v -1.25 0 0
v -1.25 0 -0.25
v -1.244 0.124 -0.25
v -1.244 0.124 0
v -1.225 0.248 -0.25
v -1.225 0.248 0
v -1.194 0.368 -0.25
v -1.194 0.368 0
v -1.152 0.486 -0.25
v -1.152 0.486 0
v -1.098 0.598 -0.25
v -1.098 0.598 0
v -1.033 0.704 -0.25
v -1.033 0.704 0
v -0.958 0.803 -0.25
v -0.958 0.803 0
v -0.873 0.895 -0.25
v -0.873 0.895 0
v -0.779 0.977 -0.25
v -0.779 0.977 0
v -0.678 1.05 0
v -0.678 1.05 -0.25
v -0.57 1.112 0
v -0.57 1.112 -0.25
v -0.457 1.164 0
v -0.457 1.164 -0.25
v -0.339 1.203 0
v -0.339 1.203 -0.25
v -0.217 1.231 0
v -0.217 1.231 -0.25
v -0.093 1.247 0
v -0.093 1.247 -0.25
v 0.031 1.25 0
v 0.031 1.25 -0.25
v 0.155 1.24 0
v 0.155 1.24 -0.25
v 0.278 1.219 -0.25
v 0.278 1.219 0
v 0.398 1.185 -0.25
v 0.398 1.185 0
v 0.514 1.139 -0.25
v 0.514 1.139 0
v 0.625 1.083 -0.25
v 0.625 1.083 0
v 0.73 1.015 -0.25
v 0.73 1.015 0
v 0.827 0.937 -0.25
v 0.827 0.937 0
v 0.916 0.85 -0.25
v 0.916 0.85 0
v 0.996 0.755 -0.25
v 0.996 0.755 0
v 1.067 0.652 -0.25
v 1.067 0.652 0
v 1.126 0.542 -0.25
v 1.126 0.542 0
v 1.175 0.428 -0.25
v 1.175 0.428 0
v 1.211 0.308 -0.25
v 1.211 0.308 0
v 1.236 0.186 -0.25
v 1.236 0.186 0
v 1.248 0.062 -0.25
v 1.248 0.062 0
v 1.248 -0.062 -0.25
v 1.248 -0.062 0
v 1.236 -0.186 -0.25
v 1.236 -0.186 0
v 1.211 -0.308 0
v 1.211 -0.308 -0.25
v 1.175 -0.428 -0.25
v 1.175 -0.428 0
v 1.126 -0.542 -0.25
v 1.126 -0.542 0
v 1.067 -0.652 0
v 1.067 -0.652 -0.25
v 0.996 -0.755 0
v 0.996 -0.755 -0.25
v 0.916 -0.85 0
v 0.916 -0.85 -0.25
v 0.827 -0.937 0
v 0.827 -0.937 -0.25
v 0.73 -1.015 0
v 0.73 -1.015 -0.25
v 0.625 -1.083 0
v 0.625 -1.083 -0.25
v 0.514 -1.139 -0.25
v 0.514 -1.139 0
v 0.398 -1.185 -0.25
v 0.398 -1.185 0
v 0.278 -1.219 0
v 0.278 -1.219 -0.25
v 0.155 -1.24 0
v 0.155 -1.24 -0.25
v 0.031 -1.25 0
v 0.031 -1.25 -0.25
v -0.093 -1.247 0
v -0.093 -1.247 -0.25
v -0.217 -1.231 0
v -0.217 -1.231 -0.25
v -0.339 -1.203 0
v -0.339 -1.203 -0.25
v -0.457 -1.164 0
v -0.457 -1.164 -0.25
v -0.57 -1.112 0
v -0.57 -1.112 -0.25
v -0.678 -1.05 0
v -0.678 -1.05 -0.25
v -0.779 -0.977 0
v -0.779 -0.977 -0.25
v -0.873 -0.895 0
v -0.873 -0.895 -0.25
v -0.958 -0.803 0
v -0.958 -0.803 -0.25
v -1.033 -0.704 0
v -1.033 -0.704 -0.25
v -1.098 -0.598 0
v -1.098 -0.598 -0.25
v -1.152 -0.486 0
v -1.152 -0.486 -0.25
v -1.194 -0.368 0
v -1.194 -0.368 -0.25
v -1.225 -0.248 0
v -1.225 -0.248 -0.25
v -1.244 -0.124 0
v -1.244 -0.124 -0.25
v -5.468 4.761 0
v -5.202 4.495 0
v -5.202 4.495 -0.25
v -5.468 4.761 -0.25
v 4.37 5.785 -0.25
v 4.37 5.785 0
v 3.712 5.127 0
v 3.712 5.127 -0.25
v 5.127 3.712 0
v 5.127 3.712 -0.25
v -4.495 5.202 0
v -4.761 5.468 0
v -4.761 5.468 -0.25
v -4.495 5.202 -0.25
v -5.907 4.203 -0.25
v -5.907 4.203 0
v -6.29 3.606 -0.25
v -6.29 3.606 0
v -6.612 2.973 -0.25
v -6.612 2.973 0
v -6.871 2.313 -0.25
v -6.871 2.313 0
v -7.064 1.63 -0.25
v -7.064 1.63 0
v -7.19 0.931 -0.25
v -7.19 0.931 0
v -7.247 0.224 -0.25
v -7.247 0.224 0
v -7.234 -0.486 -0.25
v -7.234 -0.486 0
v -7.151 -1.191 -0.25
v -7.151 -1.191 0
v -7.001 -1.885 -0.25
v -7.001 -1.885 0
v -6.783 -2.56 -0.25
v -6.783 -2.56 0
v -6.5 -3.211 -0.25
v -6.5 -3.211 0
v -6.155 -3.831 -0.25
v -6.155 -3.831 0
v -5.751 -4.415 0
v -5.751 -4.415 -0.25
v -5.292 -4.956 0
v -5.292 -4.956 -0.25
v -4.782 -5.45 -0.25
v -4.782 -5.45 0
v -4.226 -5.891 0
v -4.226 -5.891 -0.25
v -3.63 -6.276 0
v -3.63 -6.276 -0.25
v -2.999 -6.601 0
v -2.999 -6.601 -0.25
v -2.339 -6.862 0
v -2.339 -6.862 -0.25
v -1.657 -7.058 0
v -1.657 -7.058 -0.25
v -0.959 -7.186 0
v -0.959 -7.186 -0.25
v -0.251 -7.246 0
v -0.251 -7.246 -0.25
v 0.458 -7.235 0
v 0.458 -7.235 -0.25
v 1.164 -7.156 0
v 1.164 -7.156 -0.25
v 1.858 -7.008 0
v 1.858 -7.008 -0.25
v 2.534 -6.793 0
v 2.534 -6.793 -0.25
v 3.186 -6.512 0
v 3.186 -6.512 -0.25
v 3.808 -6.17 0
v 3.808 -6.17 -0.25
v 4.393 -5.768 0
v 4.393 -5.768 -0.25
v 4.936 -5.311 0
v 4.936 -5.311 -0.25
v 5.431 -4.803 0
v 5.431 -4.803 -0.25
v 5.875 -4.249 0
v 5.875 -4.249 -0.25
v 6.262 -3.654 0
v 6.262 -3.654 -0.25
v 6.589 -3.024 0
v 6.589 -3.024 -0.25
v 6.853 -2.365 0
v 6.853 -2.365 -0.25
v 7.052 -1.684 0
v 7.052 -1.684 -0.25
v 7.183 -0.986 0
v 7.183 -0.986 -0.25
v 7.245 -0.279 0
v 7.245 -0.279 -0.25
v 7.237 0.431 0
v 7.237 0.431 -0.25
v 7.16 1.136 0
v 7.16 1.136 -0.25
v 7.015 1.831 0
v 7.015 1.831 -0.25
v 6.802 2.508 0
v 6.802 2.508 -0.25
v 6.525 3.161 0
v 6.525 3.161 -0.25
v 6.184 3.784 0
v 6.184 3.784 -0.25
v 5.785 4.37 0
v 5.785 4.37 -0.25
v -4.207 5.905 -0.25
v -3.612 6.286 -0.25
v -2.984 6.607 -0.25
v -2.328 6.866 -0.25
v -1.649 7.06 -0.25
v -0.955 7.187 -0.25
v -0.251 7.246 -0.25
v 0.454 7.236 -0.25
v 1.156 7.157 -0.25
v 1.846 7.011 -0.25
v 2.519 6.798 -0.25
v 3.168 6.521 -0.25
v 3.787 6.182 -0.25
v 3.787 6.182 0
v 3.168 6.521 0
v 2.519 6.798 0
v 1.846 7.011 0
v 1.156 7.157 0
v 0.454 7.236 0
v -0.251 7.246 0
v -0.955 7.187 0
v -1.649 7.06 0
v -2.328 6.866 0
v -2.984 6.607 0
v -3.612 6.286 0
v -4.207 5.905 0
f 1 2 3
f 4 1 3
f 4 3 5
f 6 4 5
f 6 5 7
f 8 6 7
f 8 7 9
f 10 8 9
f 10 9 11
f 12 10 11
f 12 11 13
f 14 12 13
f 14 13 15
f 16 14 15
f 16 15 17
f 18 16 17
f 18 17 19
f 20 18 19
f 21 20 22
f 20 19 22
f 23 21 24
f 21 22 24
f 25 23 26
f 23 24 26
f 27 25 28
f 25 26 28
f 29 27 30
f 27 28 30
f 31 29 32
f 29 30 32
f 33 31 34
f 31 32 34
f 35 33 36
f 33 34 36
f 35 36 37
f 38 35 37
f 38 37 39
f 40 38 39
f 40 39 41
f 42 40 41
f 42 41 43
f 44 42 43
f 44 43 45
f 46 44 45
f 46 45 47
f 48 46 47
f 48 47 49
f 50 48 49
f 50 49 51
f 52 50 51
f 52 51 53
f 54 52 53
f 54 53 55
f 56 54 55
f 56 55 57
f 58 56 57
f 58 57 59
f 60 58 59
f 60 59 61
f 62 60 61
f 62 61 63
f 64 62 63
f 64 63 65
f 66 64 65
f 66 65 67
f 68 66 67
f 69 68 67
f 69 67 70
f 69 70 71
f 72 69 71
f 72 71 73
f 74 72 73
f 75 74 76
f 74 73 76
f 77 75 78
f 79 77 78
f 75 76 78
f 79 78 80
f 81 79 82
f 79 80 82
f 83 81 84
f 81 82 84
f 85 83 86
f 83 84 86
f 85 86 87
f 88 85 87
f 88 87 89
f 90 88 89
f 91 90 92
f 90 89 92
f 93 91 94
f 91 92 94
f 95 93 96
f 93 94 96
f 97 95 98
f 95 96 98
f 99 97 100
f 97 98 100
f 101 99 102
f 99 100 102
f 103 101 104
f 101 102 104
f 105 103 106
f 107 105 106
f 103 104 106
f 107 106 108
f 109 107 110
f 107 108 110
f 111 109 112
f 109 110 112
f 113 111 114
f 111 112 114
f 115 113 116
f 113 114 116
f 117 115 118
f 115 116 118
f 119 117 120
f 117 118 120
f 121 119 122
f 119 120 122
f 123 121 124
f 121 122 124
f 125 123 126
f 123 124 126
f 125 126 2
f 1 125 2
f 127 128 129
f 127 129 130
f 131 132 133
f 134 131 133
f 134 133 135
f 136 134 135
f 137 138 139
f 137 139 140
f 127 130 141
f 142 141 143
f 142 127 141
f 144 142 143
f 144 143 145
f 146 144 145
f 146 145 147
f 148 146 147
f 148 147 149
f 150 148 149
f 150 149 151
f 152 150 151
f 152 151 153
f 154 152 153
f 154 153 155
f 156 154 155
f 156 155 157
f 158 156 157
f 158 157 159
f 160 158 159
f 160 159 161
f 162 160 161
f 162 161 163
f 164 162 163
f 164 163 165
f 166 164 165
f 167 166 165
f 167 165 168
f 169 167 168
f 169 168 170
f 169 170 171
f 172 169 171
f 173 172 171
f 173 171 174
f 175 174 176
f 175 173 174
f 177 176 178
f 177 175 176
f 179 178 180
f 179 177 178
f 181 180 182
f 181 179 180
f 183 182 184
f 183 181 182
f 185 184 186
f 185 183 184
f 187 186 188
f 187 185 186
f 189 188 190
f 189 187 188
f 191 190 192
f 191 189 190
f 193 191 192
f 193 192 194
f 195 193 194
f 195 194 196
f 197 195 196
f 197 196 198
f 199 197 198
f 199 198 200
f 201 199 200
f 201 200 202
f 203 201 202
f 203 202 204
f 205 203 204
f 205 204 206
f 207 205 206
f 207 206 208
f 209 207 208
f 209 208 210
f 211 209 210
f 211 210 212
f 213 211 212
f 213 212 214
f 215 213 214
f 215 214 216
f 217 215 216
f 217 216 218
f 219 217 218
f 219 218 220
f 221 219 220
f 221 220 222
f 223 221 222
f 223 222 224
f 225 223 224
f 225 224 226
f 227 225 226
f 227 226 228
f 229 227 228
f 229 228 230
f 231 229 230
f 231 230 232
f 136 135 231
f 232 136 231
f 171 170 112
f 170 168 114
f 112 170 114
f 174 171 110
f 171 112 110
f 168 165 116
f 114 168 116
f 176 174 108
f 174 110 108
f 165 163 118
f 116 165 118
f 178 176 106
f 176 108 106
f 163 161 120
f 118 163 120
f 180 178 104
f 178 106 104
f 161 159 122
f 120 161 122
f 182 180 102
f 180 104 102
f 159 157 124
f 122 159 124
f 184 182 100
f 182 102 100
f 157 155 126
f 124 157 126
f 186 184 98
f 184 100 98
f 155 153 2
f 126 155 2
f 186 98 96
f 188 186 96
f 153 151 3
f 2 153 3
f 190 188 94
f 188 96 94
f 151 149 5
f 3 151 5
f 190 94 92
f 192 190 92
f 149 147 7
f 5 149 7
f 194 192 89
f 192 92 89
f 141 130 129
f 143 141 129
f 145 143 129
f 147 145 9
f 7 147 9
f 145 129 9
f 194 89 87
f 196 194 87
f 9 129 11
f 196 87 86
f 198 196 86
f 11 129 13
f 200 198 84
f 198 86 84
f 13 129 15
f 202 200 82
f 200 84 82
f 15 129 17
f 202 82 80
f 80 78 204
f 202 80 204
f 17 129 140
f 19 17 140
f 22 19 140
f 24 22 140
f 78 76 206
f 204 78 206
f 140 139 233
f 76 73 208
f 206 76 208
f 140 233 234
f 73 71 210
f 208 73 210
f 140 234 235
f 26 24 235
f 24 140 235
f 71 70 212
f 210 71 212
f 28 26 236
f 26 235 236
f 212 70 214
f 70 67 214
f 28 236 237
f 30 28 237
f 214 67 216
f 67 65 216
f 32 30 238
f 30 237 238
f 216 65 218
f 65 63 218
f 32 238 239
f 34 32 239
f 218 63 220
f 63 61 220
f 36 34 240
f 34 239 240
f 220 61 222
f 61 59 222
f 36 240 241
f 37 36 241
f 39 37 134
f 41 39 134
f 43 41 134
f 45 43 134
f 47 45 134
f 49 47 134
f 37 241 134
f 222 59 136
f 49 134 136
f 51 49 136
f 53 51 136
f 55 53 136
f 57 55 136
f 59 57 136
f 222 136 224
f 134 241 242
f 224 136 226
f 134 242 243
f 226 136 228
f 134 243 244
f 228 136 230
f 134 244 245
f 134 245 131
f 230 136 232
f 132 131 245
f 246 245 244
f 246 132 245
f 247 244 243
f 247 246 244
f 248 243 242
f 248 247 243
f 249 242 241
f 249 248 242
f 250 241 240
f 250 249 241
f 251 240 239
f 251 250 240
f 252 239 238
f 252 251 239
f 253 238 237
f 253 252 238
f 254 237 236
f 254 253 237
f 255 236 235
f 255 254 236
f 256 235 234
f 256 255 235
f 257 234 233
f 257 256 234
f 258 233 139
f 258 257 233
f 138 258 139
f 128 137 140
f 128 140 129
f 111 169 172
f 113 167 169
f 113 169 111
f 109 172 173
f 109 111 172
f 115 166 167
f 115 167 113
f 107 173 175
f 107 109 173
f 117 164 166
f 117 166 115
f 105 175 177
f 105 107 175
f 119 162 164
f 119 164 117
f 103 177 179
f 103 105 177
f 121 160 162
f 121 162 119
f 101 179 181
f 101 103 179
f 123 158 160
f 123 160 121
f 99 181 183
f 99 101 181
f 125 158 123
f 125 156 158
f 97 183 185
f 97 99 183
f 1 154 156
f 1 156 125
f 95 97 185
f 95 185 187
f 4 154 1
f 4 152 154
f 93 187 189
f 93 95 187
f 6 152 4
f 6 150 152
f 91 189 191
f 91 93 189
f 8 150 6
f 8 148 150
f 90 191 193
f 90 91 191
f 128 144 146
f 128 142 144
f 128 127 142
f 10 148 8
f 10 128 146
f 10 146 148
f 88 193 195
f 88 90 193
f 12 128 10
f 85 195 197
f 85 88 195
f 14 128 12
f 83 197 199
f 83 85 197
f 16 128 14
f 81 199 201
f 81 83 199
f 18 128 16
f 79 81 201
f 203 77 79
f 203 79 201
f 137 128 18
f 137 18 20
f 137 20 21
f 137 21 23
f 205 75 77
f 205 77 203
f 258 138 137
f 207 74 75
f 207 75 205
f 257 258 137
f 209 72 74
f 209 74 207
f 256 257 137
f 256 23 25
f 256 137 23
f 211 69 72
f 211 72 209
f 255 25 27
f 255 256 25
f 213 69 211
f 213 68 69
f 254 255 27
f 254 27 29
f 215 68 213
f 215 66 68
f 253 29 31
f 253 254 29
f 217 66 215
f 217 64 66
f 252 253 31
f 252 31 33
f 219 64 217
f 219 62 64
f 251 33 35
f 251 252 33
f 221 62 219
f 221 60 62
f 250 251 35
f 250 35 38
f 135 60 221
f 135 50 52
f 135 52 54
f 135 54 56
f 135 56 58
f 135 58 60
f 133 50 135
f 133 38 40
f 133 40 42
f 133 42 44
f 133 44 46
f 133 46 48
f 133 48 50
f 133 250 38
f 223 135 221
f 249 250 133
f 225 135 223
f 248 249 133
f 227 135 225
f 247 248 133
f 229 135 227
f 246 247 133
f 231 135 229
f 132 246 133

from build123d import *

# Parameters (mm, degrees)
CROQUIS1_R            = 7.25
BRIDA_BASE1_DEPTH     = 0.25
CROQUIS5_R            = 1.25
CORTAR_EXTRUIR1_DEPTH = 10
CORTAR_EXTRUIR2_DEPTH = 10


# Sheet-metal steps are written as plain solids
with BuildPart() as part:
    # Croquis1 → Brida base1 (new body)
    with BuildSketch(Plane.XY):
        Circle(CROQUIS1_R)
    extrude(amount=-BRIDA_BASE1_DEPTH)

    # Croquis5 → Cortar-Extruir1 (cut)
    with BuildSketch(Plane(origin=(0, 0, -0.25), x_dir=(-1, 0, 0), z_dir=(0, 0, -1))):
        Circle(CROQUIS5_R)
    extrude(amount=-CORTAR_EXTRUIR1_DEPTH, mode=Mode.SUBTRACT)

    # Croquis6 → Cortar-Extruir2 (cut)
    with BuildSketch(Plane.XY):
        Polygon((-5.480077554, 4.772970773), (-4.772970773, 5.480077554), (-4.494932198, 5.202038979), (-5.202038979, 4.494932198), align=None)
        Polygon((5.833630945, 4.419417382), (4.419417382, 5.833630945), (3.712310601, 5.126524164), (5.126524164, 3.712310601), align=None)
    extrude(amount=-CORTAR_EXTRUIR2_DEPTH, mode=Mode.SUBTRACT)


solid = part.part
